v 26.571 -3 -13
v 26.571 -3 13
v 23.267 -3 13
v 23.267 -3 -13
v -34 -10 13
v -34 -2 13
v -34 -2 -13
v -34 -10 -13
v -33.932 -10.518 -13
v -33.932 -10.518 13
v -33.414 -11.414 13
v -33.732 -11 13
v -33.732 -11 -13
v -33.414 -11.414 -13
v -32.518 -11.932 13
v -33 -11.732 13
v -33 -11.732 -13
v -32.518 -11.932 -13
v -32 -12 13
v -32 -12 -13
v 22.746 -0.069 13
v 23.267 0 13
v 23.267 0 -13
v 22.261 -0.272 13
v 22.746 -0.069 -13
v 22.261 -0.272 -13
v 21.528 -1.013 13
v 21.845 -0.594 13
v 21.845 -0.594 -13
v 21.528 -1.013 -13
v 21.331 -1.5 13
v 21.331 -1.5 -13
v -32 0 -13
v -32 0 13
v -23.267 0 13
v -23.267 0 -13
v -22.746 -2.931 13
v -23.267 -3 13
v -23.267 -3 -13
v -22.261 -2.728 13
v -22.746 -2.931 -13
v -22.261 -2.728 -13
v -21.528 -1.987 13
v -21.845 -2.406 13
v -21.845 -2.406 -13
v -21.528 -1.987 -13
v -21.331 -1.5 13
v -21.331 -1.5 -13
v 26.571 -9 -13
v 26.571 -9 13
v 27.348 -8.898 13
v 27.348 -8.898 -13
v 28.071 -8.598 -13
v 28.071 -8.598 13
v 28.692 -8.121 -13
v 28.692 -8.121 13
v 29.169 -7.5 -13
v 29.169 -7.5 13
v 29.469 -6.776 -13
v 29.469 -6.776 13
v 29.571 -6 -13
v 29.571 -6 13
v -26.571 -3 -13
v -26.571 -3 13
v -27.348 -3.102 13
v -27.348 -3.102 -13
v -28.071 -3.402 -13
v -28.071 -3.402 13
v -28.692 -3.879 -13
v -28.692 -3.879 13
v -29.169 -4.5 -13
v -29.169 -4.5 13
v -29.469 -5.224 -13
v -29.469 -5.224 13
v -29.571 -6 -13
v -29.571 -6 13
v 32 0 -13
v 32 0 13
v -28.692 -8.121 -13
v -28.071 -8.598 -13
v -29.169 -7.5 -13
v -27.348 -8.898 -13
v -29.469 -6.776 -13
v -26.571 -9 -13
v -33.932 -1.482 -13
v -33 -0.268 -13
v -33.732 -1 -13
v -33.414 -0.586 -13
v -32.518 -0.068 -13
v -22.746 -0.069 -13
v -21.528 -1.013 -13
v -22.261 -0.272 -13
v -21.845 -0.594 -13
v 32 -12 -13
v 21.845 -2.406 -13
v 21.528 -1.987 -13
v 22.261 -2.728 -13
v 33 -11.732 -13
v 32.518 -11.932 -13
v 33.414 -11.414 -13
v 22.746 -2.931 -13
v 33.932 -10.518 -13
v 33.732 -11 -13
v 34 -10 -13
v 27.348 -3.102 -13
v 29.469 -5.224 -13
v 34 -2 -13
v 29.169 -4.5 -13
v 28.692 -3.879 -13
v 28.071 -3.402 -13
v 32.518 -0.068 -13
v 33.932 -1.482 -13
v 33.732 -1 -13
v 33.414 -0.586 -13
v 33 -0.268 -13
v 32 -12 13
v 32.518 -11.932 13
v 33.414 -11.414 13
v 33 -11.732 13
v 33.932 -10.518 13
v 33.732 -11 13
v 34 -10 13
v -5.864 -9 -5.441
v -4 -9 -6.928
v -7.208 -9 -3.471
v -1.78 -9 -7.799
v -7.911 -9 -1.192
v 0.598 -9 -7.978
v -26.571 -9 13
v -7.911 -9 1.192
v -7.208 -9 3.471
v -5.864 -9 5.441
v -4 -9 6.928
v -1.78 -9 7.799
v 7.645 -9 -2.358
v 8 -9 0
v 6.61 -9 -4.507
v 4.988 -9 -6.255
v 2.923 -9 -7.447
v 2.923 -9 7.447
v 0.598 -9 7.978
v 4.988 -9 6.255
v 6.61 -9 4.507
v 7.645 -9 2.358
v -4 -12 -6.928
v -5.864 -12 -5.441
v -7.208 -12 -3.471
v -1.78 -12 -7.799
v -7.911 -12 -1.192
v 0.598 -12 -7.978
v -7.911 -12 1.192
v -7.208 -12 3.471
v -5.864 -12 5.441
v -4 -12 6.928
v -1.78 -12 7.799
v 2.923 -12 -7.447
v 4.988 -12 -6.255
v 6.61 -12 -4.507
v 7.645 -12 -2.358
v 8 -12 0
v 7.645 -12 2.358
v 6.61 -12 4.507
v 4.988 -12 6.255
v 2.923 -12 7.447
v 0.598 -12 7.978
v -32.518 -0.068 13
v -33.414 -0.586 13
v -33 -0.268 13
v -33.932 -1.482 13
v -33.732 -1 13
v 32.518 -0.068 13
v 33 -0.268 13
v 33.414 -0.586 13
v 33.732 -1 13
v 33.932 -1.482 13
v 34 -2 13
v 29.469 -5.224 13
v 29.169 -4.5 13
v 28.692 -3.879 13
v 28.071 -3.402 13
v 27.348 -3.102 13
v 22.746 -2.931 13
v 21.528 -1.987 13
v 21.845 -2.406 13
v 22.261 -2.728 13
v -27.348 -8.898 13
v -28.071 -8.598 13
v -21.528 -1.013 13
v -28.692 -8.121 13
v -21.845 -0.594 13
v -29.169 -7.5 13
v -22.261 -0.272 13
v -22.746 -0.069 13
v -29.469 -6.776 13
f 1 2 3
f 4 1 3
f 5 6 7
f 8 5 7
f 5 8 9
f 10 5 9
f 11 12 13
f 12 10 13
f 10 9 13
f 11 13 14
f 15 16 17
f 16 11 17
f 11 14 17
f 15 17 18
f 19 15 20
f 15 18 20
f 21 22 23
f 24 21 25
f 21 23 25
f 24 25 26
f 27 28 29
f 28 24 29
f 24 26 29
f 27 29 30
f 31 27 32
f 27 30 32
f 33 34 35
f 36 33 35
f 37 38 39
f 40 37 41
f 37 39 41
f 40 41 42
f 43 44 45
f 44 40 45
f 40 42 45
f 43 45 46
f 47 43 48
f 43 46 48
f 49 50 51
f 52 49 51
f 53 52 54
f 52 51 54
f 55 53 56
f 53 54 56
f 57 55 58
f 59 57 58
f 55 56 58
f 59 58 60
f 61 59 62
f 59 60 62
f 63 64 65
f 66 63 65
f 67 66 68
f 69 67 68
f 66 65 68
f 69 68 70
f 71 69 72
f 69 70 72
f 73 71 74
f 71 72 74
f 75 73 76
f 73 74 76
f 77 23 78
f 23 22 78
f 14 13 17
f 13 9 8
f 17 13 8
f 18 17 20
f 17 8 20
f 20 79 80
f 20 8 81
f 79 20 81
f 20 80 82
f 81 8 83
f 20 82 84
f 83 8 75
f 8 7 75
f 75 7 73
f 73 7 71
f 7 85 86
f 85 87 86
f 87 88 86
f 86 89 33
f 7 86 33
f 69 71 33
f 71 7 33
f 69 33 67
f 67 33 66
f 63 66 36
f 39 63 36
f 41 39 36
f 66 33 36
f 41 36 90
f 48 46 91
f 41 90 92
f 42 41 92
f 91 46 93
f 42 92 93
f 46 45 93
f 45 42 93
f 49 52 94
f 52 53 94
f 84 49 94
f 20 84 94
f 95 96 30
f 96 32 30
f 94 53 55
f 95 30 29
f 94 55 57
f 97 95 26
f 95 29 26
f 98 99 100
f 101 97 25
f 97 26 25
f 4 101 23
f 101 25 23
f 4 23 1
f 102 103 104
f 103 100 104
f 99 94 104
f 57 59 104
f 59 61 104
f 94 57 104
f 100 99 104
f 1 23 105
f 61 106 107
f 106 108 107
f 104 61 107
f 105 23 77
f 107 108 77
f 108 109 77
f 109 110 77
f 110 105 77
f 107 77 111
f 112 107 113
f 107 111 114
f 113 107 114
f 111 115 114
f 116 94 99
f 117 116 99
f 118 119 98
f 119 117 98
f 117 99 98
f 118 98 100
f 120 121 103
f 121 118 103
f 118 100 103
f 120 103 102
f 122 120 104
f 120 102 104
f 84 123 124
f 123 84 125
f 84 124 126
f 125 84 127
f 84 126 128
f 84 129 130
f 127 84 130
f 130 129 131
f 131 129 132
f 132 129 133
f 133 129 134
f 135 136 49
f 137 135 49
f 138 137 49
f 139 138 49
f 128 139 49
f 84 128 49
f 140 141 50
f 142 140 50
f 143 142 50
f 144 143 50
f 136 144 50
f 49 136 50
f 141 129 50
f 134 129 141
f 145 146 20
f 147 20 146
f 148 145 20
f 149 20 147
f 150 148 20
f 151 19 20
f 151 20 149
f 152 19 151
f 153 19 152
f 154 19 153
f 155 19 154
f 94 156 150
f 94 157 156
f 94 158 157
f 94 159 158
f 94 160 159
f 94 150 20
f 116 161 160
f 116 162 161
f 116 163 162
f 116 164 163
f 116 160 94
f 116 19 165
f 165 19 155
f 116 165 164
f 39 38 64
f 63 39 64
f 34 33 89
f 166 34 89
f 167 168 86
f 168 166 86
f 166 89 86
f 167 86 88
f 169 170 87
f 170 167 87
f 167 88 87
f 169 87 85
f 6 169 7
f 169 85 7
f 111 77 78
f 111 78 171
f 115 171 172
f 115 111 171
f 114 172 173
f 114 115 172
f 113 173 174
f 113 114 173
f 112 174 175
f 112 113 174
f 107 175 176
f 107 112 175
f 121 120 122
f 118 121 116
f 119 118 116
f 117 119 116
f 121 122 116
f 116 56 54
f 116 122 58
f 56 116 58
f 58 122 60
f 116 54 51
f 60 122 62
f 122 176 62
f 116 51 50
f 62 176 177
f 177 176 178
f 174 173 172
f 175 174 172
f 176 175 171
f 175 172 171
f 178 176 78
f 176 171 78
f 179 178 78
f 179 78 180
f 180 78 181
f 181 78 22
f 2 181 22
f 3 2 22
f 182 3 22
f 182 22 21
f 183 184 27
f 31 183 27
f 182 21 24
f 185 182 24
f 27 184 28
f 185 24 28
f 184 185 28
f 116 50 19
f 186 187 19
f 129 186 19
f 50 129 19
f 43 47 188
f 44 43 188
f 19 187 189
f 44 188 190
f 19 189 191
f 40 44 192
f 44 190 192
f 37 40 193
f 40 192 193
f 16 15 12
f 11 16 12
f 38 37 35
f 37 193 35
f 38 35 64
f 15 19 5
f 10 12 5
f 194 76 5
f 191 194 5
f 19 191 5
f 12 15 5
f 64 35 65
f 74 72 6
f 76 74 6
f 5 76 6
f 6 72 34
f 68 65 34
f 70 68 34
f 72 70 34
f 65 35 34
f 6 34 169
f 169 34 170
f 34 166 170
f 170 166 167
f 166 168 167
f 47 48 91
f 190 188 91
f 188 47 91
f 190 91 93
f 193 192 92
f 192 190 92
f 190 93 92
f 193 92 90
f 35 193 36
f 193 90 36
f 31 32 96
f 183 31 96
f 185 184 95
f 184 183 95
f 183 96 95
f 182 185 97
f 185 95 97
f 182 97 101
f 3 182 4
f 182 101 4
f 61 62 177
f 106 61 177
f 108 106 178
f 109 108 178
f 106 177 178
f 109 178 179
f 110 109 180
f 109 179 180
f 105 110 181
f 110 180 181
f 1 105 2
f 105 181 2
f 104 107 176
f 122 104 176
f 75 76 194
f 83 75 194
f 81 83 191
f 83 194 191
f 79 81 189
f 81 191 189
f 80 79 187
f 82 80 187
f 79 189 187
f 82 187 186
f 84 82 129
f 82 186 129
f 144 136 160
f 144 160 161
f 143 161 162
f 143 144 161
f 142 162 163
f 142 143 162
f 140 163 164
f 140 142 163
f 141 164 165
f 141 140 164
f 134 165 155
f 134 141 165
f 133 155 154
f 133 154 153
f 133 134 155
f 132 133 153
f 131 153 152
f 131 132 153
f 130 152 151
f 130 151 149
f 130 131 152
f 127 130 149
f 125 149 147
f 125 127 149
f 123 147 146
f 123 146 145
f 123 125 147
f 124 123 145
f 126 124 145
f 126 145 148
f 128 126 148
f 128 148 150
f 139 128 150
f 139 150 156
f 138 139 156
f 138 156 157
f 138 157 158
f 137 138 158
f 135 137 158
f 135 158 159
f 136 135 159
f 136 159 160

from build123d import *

# Parameters (mm, degrees)
F0_R        = 8
F1_DEPTH    = 12
F3_DEPTH    = 40
F4_T1_DEPTH = 36


# Not quite as in the source:
# - a fillet or chamfer that OpenCascade refuses, or shapes differently, is made with other operations: its cross-section is extruded or revolved along the edge and cut away or added
# - a feature names something its author has since deleted; it is built from what else it names


with BuildPart() as f1:
    # F0 (on Front) → F1 (new body)
    with BuildSketch(Plane.XZ):
        Polygon((34, 13), (-34, 13), (-34, 0), (-34, -13), (34, -13), align=None)
        Circle(F0_R, mode=Mode.SUBTRACT)
    extrude(amount=F1_DEPTH)

    # F2 (on face) → F3 (cut)
    with BuildSketch(Plane.XY.offset(13)):
        with BuildLine():
            Line((-21.2670322508, -3), (-26.5711637536, -3))
            ThreePointArc((-26.5711637536, -3), (-28.6924840972, -3.8786796564), (-29.5711637536, -6))
            ThreePointArc((-29.5711637536, -6), (-28.6924840972, -8.1213203436), (-26.5711637536, -9))
            Line((-26.5711637536, -9), (26.5711637536, -9))
            ThreePointArc((26.5711637536, -9), (28.6924840972, -8.1213203436), (29.5711637536, -6))
            ThreePointArc((29.5711637536, -6), (28.6924840972, -3.8786796564), (26.5711637536, -3))
            Line((26.5711637536, -3), (21.2670322508, -3))
            Line((21.2670322508, -3), (21.2670322508, 0))
            Line((21.2670322508, 0), (0, 0))
            Line((0, 0), (-21.2670322508, 0))
            Line((-21.2670322508, 0), (-21.2670322508, -3))
        make_face()
    extrude(amount=-F3_DEPTH, mode=Mode.SUBTRACT)

    # F4: fillet of radius 2 on 8 edges, made by hand

    # F4_s2 → F4_t1 (cut)
    with BuildSketch(Plane.XY.offset(-18)):
        with BuildLine():
            ThreePointArc((32, -12), (33.4142135624, -11.4142135624), (34, -10))
            Line((34, -10), (34, -12))
            Line((34, -12), (32, -12))
        make_face()
        with BuildLine():
            ThreePointArc((32, 0), (33.4142135624, -0.5857864376), (34, -2))
            Line((34, -2), (34, 0))
            Line((34, 0), (32, 0))
        make_face()
        with BuildLine():
            ThreePointArc((-21.2670322508, -2), (-21.8528186884, -0.5857864376), (-23.2670322508, 0))
            Line((-23.2670322508, 0), (-21.2670322508, 0))
            Line((-21.2670322508, 0), (-21.2670322508, -2))
        make_face()
        with BuildLine():
            ThreePointArc((23.2670322508, 0), (21.8528186884, -0.5857864376), (21.2670322508, -2))
            Line((21.2670322508, -2), (21.2670322508, 0))
            Line((21.2670322508, 0), (23.2670322508, 0))
        make_face()
        with BuildLine():
            ThreePointArc((-32, 0), (-33.4142135624, -0.5857864376), (-34, -2))
            Line((-34, -2), (-34, 0))
            Line((-34, 0), (-32, 0))
        make_face()
        with BuildLine():
            ThreePointArc((-34, -10), (-33.4142135624, -11.4142135624), (-32, -12))
            Line((-32, -12), (-34, -12))
            Line((-34, -12), (-34, -10))
        make_face()
        with BuildLine():
            ThreePointArc((-23.2670322508, -3), (-21.8528186884, -2.4142135624), (-21.2670322508, -1))
            Line((-21.2670322508, -1), (-21.2670322508, -3))
            Line((-21.2670322508, -3), (-23.2670322508, -3))
        make_face()
        with BuildLine():
            ThreePointArc((21.2670322508, -1), (21.8528186884, -2.4142135624), (23.2670322508, -3))
            Line((23.2670322508, -3), (21.2670322508, -3))
            Line((21.2670322508, -3), (21.2670322508, -1))
        make_face()
    extrude(amount=F4_T1_DEPTH, mode=Mode.SUBTRACT)


solid = f1.part
